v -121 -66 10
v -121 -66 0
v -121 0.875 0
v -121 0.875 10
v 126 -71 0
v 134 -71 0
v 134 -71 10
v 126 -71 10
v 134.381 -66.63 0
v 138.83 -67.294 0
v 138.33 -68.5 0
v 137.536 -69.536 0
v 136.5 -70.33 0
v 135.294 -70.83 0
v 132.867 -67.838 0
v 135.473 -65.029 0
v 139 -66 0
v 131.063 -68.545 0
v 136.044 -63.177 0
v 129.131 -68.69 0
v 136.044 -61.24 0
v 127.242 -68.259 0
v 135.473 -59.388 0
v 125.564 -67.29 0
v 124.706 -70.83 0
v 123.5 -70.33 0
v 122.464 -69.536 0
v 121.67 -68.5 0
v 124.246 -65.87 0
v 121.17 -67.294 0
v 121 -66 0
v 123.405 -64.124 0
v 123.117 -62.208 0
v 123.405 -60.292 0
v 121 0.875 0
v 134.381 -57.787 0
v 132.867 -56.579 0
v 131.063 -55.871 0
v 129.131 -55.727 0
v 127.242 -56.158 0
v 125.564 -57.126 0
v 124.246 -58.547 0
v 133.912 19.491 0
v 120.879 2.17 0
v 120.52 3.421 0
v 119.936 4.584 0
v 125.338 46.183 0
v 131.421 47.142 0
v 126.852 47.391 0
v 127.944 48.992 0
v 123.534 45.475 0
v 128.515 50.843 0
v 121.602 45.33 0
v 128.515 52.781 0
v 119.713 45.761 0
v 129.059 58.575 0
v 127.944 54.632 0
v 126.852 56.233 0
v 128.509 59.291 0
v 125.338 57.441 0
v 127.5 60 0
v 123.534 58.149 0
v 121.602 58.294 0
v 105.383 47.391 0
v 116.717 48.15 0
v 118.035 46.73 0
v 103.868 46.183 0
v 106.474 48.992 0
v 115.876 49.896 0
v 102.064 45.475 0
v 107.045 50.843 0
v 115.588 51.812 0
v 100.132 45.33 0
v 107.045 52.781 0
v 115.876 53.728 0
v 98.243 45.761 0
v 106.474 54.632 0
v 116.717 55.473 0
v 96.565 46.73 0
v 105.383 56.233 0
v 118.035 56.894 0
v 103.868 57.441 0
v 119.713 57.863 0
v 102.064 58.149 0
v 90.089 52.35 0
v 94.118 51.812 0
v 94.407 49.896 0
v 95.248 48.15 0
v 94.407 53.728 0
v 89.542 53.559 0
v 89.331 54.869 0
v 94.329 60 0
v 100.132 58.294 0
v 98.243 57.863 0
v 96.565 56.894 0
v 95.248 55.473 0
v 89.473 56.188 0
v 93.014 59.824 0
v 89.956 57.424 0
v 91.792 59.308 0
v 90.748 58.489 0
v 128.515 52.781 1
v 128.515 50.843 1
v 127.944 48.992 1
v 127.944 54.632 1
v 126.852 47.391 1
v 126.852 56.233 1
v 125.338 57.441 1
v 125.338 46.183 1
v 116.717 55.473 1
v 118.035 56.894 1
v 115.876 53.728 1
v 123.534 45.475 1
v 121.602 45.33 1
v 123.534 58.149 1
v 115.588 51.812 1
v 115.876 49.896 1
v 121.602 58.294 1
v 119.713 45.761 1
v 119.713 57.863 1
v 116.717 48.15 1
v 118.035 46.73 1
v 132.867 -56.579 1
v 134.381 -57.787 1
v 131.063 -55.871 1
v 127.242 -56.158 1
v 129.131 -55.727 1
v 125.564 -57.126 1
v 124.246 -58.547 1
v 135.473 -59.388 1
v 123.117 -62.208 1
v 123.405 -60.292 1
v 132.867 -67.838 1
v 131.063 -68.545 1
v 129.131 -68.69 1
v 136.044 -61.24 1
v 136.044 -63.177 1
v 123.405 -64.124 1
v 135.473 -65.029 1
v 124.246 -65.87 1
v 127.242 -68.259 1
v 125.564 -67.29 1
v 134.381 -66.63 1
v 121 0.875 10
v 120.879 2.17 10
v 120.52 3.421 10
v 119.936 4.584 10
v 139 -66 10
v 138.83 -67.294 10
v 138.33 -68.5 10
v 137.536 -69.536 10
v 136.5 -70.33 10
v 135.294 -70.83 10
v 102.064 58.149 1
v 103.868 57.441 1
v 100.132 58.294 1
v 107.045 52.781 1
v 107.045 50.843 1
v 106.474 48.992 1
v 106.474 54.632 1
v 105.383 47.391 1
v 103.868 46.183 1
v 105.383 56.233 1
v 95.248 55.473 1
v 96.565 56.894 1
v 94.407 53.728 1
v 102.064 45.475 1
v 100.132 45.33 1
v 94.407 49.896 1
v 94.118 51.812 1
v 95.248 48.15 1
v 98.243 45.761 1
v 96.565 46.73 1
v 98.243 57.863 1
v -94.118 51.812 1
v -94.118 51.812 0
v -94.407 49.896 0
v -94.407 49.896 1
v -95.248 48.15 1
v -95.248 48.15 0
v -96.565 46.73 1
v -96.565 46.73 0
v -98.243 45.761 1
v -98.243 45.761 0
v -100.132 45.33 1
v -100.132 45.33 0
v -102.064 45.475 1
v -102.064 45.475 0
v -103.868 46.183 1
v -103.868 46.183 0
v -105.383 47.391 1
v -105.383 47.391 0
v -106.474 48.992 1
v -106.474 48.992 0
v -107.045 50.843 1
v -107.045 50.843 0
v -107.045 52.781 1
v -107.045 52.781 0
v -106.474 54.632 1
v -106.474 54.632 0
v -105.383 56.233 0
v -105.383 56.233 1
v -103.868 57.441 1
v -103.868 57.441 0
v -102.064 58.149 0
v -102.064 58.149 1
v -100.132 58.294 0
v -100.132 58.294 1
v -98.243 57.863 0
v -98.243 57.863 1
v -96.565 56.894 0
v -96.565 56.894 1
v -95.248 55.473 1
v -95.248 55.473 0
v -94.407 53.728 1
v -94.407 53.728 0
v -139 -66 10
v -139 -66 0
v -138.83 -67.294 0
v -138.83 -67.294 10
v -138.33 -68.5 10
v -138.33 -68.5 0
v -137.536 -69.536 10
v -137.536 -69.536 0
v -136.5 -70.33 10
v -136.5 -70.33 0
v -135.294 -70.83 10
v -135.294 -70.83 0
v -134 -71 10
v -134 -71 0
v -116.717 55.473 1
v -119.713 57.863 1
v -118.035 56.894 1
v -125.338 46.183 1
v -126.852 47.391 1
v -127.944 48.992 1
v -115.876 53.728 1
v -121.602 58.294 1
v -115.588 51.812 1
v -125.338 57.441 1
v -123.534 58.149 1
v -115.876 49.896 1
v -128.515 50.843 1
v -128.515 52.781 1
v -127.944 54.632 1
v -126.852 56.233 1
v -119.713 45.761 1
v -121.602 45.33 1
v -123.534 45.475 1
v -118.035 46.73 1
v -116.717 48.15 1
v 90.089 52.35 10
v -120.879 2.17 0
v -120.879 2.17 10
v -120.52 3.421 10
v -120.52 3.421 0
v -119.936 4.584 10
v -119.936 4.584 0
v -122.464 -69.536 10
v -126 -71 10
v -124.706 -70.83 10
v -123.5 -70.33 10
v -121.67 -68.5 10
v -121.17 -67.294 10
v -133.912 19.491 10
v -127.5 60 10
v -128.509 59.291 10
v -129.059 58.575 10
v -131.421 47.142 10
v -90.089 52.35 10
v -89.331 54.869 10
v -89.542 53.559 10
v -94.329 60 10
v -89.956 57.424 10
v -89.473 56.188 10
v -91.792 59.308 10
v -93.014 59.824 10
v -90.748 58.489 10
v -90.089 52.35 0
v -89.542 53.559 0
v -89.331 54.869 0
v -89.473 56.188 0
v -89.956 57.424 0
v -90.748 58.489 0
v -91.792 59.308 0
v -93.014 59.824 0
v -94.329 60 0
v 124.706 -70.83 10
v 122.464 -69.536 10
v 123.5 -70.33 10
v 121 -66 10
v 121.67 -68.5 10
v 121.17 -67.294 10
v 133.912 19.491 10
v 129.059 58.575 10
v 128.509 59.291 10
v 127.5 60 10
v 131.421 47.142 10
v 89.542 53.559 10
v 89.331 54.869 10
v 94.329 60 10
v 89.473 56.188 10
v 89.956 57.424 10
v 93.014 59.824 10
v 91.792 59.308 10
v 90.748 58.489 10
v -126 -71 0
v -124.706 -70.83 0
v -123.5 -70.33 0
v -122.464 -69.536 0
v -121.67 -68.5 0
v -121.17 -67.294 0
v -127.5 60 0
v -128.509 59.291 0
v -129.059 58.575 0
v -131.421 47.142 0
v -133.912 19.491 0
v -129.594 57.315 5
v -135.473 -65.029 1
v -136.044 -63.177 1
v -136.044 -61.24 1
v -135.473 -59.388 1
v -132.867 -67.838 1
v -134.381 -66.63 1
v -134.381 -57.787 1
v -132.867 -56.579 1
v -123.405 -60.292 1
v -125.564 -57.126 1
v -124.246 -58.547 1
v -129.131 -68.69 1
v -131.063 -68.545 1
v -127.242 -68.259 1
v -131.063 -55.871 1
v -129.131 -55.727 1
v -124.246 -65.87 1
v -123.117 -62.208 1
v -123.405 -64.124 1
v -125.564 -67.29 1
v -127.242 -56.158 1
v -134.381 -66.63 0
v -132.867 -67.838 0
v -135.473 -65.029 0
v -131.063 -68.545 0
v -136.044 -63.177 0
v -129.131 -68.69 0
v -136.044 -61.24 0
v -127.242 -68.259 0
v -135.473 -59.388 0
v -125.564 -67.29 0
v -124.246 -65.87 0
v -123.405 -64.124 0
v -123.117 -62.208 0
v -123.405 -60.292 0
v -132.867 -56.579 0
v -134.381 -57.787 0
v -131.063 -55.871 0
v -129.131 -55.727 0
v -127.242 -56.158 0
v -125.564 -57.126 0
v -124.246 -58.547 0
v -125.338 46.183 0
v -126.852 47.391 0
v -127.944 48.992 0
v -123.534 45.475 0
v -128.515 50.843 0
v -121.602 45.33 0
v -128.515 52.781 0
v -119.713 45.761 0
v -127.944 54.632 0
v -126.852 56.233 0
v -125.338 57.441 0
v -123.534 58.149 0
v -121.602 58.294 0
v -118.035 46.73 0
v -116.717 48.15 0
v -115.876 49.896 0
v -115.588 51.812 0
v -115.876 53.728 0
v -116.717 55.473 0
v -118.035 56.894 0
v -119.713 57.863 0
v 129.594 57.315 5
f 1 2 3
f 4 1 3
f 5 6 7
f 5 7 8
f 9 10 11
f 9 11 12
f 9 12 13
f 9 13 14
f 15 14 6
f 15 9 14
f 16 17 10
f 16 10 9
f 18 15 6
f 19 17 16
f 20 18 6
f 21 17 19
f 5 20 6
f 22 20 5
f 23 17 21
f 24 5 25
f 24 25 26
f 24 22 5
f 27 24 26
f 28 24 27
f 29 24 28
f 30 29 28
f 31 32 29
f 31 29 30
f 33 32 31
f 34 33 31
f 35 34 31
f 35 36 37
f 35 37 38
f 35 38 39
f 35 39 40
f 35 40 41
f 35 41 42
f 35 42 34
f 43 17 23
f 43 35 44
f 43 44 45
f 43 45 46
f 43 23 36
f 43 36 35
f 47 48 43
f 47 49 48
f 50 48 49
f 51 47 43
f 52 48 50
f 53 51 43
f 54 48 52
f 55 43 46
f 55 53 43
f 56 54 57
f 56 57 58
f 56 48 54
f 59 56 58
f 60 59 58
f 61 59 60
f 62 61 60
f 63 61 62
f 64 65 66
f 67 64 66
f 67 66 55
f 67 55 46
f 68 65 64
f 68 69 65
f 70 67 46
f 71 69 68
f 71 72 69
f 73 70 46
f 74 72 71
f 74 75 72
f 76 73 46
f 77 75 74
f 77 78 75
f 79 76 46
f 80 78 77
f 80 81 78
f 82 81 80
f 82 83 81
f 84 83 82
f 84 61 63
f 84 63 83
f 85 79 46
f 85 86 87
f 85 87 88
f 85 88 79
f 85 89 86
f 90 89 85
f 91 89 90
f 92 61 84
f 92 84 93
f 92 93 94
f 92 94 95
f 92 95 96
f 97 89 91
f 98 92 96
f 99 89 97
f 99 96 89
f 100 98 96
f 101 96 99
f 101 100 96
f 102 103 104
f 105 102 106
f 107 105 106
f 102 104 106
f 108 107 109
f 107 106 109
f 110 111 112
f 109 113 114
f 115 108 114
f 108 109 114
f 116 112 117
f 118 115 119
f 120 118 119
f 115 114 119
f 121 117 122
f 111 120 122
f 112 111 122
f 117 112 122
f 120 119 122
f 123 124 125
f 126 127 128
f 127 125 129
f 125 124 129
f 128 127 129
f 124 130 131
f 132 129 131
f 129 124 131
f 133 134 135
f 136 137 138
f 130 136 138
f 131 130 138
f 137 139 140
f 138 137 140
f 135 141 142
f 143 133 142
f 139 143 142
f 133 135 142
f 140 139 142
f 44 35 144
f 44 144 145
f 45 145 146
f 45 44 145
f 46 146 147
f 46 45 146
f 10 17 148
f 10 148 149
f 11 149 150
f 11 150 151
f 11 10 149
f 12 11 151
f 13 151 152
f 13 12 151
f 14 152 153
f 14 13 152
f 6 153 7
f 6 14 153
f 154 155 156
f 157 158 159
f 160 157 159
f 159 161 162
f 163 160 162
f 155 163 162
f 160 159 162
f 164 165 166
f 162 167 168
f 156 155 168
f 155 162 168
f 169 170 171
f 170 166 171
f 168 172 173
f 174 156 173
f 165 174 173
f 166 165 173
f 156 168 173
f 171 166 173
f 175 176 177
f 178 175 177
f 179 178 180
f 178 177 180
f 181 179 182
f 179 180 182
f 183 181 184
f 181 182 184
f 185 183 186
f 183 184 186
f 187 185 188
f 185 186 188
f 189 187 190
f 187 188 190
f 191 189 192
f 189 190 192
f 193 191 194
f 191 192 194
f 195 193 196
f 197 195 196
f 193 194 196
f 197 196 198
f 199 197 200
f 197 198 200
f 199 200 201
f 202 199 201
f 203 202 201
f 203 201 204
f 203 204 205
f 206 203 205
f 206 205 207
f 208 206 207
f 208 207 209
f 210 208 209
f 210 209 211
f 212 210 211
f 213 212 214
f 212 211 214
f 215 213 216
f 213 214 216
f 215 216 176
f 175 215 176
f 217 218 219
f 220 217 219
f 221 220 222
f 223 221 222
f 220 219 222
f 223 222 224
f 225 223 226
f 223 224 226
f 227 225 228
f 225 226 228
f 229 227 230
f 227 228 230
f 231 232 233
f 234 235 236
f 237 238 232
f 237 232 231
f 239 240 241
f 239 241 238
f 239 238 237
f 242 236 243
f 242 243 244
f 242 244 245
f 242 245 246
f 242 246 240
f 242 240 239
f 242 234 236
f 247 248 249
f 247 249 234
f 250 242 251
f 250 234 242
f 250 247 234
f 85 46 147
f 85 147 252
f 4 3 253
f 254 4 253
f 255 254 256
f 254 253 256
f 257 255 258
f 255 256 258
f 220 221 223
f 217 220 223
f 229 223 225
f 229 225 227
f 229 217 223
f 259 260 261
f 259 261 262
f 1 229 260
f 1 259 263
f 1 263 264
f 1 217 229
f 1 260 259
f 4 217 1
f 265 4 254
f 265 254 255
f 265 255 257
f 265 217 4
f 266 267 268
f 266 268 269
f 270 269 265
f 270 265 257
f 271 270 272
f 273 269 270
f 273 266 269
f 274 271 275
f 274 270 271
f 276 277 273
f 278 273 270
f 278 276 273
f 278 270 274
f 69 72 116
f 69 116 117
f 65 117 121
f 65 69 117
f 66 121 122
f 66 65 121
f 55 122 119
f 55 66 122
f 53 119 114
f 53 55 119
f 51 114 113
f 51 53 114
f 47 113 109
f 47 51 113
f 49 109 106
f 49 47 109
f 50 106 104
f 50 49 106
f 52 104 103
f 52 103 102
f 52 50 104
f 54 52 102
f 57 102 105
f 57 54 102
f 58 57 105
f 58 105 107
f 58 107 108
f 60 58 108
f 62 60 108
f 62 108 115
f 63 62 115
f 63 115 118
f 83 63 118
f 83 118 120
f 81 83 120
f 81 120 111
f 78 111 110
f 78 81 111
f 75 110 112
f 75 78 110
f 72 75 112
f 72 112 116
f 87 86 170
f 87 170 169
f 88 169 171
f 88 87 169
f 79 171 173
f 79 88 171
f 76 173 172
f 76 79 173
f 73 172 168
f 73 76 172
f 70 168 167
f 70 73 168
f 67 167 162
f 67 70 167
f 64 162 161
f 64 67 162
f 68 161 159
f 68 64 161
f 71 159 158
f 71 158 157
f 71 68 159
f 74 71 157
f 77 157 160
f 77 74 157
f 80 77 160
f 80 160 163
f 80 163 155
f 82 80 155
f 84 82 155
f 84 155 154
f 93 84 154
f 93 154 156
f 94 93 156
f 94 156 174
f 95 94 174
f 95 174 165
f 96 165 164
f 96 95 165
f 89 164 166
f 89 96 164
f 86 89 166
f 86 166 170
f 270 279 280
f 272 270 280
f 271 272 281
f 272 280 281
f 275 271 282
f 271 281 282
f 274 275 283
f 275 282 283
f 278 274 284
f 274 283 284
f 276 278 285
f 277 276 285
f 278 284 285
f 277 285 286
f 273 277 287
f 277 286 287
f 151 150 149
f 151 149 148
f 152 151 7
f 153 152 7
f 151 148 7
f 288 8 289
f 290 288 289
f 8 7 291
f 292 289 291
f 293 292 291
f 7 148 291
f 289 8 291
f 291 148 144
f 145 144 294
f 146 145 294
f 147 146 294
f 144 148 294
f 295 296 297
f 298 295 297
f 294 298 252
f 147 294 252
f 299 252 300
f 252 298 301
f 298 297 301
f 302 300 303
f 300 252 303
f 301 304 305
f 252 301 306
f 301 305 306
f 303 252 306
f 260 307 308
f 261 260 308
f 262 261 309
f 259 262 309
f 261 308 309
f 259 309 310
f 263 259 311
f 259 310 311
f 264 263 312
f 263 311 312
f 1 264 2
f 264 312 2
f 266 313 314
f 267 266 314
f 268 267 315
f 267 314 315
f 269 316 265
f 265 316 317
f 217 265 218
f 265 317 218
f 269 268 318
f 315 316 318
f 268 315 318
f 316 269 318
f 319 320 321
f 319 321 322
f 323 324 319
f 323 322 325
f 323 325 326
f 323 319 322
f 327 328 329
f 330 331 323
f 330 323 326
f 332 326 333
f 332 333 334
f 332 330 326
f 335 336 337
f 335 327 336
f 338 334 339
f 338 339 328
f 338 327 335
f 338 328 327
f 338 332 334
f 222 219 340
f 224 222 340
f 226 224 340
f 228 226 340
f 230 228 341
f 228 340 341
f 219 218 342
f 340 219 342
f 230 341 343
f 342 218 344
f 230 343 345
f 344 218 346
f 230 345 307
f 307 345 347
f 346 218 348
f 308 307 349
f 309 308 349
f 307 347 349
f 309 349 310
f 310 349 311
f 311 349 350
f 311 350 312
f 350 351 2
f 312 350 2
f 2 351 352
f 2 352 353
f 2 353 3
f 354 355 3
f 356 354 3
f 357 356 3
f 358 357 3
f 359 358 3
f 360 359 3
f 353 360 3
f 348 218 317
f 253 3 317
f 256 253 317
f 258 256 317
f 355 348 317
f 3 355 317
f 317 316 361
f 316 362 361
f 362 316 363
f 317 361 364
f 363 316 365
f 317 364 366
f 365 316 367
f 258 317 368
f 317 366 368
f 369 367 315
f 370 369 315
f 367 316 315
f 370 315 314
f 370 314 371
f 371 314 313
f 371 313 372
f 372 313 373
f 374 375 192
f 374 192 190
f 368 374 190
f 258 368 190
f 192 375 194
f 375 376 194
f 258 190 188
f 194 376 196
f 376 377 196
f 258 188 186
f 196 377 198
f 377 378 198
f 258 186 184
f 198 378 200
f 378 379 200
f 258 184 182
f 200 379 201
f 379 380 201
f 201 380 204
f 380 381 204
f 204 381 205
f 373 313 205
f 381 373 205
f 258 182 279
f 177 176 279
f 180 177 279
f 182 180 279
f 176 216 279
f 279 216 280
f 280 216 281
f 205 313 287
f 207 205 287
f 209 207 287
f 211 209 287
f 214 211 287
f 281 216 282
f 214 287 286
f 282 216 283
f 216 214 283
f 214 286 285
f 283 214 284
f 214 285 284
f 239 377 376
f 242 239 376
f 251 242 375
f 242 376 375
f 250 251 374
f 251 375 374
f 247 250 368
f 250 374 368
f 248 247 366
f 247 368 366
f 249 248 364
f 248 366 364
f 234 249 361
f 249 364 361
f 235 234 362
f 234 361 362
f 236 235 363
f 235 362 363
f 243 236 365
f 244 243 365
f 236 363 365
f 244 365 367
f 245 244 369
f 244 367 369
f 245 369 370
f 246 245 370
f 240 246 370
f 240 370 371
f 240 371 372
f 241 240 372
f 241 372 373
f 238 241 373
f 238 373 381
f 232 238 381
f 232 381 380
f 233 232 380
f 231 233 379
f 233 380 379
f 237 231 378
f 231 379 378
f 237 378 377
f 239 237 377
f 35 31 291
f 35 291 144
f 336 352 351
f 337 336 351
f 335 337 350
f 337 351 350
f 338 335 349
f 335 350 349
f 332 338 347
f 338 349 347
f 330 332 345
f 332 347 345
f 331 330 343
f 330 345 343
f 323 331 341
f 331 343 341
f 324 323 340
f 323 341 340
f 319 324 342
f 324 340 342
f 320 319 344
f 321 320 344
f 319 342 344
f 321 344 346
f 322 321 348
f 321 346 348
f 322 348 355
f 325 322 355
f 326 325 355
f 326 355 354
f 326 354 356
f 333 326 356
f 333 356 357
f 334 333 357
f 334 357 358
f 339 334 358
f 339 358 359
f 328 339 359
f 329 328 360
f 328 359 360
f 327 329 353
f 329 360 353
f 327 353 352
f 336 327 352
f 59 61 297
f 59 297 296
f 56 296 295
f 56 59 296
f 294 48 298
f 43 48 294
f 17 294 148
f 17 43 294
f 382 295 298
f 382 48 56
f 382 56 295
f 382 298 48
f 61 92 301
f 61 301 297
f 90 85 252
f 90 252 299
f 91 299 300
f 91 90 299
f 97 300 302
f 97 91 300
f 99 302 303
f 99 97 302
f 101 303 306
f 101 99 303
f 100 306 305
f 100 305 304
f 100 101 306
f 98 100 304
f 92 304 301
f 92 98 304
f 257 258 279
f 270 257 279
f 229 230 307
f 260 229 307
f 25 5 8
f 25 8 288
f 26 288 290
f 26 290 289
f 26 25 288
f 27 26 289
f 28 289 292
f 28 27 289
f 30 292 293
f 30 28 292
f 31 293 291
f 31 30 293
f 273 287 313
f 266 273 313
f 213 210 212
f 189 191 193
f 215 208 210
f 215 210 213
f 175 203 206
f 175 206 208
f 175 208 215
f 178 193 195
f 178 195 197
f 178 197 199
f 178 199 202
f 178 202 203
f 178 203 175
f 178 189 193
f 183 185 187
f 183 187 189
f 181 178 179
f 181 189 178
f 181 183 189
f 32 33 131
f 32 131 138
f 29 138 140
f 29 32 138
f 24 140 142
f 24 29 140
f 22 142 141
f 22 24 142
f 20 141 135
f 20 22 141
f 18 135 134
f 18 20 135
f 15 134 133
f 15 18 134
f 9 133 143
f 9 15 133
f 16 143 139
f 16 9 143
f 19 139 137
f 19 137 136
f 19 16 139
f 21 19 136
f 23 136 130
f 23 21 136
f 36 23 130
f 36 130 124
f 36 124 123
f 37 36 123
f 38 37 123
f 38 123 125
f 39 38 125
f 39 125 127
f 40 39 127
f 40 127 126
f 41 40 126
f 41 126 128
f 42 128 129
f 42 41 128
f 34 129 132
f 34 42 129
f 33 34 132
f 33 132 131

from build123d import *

# Parameters (mm, degrees)
F3_DEPTH = 10
F5_R     = 6.5
F6_DEPTH = 1


with BuildPart() as f3:
    # F2 (on Top) → F3 (new body)
    with BuildSketch(Plane.XY):
        with BuildLine():
            ThreePointArc((-139, -66), (-137.5355339059, -69.5355339059), (-134, -71))
            Line((-134, -71), (-126, -71))
            ThreePointArc((-126, -71), (-122.4644660941, -69.5355339059), (-121, -66))
            Line((-121, -66), (-121, 0.8747540957))
            ThreePointArc((-121, 0.8747540957), (-120.7288400494, 2.8041870666), (-119.9363681173, 4.5841386236))
            Line((-119.9363681173, 4.5841386236), (-90.0892335764, 52.3504396229))
            ThreePointArc((-90.0892335764, 52.3504396229), (-89.9564082559, 57.4240666363), (-94.3294965174, 60))
            Line((-94.3294965174, 60), (-123, 60))
            Line((-123, 60), (-127.5, 60))
            add(Edge.make_bspline(
                [(-127.5, 60), (-128.5309515502, 59.4252718402), (-132.3109857139, 55.8750775163), (-135.4628480418, -1.9731064327), (-139, -66)],
                knots=[0, 0, 0, 0, 0.1423154771, 1, 1, 1, 1], degree=3))
        make_face()
    extrude(amount=F3_DEPTH)

    # F5 (on face) → F6 (cut)
    with BuildSketch(Plane(origin=(0, 0, 0), x_dir=(1, 0, 0), z_dir=(0, 0, -1))):
        with Locations((-129.6166181564, 62.2083842754)):
            Circle(F5_R)
        with Locations((-100.6180867553, -51.8119037151)):
            Circle(F5_R)
        with Locations((-122.0875009894, -51.8119037151)):
            Circle(F5_R)
    extrude(amount=-F6_DEPTH, mode=Mode.SUBTRACT)


with BuildPart() as f7_1:
    # F7: instance of F3
    add(f3.part.mirror(Plane.YZ))


solid = Compound([f3.part, f7_1.part])
